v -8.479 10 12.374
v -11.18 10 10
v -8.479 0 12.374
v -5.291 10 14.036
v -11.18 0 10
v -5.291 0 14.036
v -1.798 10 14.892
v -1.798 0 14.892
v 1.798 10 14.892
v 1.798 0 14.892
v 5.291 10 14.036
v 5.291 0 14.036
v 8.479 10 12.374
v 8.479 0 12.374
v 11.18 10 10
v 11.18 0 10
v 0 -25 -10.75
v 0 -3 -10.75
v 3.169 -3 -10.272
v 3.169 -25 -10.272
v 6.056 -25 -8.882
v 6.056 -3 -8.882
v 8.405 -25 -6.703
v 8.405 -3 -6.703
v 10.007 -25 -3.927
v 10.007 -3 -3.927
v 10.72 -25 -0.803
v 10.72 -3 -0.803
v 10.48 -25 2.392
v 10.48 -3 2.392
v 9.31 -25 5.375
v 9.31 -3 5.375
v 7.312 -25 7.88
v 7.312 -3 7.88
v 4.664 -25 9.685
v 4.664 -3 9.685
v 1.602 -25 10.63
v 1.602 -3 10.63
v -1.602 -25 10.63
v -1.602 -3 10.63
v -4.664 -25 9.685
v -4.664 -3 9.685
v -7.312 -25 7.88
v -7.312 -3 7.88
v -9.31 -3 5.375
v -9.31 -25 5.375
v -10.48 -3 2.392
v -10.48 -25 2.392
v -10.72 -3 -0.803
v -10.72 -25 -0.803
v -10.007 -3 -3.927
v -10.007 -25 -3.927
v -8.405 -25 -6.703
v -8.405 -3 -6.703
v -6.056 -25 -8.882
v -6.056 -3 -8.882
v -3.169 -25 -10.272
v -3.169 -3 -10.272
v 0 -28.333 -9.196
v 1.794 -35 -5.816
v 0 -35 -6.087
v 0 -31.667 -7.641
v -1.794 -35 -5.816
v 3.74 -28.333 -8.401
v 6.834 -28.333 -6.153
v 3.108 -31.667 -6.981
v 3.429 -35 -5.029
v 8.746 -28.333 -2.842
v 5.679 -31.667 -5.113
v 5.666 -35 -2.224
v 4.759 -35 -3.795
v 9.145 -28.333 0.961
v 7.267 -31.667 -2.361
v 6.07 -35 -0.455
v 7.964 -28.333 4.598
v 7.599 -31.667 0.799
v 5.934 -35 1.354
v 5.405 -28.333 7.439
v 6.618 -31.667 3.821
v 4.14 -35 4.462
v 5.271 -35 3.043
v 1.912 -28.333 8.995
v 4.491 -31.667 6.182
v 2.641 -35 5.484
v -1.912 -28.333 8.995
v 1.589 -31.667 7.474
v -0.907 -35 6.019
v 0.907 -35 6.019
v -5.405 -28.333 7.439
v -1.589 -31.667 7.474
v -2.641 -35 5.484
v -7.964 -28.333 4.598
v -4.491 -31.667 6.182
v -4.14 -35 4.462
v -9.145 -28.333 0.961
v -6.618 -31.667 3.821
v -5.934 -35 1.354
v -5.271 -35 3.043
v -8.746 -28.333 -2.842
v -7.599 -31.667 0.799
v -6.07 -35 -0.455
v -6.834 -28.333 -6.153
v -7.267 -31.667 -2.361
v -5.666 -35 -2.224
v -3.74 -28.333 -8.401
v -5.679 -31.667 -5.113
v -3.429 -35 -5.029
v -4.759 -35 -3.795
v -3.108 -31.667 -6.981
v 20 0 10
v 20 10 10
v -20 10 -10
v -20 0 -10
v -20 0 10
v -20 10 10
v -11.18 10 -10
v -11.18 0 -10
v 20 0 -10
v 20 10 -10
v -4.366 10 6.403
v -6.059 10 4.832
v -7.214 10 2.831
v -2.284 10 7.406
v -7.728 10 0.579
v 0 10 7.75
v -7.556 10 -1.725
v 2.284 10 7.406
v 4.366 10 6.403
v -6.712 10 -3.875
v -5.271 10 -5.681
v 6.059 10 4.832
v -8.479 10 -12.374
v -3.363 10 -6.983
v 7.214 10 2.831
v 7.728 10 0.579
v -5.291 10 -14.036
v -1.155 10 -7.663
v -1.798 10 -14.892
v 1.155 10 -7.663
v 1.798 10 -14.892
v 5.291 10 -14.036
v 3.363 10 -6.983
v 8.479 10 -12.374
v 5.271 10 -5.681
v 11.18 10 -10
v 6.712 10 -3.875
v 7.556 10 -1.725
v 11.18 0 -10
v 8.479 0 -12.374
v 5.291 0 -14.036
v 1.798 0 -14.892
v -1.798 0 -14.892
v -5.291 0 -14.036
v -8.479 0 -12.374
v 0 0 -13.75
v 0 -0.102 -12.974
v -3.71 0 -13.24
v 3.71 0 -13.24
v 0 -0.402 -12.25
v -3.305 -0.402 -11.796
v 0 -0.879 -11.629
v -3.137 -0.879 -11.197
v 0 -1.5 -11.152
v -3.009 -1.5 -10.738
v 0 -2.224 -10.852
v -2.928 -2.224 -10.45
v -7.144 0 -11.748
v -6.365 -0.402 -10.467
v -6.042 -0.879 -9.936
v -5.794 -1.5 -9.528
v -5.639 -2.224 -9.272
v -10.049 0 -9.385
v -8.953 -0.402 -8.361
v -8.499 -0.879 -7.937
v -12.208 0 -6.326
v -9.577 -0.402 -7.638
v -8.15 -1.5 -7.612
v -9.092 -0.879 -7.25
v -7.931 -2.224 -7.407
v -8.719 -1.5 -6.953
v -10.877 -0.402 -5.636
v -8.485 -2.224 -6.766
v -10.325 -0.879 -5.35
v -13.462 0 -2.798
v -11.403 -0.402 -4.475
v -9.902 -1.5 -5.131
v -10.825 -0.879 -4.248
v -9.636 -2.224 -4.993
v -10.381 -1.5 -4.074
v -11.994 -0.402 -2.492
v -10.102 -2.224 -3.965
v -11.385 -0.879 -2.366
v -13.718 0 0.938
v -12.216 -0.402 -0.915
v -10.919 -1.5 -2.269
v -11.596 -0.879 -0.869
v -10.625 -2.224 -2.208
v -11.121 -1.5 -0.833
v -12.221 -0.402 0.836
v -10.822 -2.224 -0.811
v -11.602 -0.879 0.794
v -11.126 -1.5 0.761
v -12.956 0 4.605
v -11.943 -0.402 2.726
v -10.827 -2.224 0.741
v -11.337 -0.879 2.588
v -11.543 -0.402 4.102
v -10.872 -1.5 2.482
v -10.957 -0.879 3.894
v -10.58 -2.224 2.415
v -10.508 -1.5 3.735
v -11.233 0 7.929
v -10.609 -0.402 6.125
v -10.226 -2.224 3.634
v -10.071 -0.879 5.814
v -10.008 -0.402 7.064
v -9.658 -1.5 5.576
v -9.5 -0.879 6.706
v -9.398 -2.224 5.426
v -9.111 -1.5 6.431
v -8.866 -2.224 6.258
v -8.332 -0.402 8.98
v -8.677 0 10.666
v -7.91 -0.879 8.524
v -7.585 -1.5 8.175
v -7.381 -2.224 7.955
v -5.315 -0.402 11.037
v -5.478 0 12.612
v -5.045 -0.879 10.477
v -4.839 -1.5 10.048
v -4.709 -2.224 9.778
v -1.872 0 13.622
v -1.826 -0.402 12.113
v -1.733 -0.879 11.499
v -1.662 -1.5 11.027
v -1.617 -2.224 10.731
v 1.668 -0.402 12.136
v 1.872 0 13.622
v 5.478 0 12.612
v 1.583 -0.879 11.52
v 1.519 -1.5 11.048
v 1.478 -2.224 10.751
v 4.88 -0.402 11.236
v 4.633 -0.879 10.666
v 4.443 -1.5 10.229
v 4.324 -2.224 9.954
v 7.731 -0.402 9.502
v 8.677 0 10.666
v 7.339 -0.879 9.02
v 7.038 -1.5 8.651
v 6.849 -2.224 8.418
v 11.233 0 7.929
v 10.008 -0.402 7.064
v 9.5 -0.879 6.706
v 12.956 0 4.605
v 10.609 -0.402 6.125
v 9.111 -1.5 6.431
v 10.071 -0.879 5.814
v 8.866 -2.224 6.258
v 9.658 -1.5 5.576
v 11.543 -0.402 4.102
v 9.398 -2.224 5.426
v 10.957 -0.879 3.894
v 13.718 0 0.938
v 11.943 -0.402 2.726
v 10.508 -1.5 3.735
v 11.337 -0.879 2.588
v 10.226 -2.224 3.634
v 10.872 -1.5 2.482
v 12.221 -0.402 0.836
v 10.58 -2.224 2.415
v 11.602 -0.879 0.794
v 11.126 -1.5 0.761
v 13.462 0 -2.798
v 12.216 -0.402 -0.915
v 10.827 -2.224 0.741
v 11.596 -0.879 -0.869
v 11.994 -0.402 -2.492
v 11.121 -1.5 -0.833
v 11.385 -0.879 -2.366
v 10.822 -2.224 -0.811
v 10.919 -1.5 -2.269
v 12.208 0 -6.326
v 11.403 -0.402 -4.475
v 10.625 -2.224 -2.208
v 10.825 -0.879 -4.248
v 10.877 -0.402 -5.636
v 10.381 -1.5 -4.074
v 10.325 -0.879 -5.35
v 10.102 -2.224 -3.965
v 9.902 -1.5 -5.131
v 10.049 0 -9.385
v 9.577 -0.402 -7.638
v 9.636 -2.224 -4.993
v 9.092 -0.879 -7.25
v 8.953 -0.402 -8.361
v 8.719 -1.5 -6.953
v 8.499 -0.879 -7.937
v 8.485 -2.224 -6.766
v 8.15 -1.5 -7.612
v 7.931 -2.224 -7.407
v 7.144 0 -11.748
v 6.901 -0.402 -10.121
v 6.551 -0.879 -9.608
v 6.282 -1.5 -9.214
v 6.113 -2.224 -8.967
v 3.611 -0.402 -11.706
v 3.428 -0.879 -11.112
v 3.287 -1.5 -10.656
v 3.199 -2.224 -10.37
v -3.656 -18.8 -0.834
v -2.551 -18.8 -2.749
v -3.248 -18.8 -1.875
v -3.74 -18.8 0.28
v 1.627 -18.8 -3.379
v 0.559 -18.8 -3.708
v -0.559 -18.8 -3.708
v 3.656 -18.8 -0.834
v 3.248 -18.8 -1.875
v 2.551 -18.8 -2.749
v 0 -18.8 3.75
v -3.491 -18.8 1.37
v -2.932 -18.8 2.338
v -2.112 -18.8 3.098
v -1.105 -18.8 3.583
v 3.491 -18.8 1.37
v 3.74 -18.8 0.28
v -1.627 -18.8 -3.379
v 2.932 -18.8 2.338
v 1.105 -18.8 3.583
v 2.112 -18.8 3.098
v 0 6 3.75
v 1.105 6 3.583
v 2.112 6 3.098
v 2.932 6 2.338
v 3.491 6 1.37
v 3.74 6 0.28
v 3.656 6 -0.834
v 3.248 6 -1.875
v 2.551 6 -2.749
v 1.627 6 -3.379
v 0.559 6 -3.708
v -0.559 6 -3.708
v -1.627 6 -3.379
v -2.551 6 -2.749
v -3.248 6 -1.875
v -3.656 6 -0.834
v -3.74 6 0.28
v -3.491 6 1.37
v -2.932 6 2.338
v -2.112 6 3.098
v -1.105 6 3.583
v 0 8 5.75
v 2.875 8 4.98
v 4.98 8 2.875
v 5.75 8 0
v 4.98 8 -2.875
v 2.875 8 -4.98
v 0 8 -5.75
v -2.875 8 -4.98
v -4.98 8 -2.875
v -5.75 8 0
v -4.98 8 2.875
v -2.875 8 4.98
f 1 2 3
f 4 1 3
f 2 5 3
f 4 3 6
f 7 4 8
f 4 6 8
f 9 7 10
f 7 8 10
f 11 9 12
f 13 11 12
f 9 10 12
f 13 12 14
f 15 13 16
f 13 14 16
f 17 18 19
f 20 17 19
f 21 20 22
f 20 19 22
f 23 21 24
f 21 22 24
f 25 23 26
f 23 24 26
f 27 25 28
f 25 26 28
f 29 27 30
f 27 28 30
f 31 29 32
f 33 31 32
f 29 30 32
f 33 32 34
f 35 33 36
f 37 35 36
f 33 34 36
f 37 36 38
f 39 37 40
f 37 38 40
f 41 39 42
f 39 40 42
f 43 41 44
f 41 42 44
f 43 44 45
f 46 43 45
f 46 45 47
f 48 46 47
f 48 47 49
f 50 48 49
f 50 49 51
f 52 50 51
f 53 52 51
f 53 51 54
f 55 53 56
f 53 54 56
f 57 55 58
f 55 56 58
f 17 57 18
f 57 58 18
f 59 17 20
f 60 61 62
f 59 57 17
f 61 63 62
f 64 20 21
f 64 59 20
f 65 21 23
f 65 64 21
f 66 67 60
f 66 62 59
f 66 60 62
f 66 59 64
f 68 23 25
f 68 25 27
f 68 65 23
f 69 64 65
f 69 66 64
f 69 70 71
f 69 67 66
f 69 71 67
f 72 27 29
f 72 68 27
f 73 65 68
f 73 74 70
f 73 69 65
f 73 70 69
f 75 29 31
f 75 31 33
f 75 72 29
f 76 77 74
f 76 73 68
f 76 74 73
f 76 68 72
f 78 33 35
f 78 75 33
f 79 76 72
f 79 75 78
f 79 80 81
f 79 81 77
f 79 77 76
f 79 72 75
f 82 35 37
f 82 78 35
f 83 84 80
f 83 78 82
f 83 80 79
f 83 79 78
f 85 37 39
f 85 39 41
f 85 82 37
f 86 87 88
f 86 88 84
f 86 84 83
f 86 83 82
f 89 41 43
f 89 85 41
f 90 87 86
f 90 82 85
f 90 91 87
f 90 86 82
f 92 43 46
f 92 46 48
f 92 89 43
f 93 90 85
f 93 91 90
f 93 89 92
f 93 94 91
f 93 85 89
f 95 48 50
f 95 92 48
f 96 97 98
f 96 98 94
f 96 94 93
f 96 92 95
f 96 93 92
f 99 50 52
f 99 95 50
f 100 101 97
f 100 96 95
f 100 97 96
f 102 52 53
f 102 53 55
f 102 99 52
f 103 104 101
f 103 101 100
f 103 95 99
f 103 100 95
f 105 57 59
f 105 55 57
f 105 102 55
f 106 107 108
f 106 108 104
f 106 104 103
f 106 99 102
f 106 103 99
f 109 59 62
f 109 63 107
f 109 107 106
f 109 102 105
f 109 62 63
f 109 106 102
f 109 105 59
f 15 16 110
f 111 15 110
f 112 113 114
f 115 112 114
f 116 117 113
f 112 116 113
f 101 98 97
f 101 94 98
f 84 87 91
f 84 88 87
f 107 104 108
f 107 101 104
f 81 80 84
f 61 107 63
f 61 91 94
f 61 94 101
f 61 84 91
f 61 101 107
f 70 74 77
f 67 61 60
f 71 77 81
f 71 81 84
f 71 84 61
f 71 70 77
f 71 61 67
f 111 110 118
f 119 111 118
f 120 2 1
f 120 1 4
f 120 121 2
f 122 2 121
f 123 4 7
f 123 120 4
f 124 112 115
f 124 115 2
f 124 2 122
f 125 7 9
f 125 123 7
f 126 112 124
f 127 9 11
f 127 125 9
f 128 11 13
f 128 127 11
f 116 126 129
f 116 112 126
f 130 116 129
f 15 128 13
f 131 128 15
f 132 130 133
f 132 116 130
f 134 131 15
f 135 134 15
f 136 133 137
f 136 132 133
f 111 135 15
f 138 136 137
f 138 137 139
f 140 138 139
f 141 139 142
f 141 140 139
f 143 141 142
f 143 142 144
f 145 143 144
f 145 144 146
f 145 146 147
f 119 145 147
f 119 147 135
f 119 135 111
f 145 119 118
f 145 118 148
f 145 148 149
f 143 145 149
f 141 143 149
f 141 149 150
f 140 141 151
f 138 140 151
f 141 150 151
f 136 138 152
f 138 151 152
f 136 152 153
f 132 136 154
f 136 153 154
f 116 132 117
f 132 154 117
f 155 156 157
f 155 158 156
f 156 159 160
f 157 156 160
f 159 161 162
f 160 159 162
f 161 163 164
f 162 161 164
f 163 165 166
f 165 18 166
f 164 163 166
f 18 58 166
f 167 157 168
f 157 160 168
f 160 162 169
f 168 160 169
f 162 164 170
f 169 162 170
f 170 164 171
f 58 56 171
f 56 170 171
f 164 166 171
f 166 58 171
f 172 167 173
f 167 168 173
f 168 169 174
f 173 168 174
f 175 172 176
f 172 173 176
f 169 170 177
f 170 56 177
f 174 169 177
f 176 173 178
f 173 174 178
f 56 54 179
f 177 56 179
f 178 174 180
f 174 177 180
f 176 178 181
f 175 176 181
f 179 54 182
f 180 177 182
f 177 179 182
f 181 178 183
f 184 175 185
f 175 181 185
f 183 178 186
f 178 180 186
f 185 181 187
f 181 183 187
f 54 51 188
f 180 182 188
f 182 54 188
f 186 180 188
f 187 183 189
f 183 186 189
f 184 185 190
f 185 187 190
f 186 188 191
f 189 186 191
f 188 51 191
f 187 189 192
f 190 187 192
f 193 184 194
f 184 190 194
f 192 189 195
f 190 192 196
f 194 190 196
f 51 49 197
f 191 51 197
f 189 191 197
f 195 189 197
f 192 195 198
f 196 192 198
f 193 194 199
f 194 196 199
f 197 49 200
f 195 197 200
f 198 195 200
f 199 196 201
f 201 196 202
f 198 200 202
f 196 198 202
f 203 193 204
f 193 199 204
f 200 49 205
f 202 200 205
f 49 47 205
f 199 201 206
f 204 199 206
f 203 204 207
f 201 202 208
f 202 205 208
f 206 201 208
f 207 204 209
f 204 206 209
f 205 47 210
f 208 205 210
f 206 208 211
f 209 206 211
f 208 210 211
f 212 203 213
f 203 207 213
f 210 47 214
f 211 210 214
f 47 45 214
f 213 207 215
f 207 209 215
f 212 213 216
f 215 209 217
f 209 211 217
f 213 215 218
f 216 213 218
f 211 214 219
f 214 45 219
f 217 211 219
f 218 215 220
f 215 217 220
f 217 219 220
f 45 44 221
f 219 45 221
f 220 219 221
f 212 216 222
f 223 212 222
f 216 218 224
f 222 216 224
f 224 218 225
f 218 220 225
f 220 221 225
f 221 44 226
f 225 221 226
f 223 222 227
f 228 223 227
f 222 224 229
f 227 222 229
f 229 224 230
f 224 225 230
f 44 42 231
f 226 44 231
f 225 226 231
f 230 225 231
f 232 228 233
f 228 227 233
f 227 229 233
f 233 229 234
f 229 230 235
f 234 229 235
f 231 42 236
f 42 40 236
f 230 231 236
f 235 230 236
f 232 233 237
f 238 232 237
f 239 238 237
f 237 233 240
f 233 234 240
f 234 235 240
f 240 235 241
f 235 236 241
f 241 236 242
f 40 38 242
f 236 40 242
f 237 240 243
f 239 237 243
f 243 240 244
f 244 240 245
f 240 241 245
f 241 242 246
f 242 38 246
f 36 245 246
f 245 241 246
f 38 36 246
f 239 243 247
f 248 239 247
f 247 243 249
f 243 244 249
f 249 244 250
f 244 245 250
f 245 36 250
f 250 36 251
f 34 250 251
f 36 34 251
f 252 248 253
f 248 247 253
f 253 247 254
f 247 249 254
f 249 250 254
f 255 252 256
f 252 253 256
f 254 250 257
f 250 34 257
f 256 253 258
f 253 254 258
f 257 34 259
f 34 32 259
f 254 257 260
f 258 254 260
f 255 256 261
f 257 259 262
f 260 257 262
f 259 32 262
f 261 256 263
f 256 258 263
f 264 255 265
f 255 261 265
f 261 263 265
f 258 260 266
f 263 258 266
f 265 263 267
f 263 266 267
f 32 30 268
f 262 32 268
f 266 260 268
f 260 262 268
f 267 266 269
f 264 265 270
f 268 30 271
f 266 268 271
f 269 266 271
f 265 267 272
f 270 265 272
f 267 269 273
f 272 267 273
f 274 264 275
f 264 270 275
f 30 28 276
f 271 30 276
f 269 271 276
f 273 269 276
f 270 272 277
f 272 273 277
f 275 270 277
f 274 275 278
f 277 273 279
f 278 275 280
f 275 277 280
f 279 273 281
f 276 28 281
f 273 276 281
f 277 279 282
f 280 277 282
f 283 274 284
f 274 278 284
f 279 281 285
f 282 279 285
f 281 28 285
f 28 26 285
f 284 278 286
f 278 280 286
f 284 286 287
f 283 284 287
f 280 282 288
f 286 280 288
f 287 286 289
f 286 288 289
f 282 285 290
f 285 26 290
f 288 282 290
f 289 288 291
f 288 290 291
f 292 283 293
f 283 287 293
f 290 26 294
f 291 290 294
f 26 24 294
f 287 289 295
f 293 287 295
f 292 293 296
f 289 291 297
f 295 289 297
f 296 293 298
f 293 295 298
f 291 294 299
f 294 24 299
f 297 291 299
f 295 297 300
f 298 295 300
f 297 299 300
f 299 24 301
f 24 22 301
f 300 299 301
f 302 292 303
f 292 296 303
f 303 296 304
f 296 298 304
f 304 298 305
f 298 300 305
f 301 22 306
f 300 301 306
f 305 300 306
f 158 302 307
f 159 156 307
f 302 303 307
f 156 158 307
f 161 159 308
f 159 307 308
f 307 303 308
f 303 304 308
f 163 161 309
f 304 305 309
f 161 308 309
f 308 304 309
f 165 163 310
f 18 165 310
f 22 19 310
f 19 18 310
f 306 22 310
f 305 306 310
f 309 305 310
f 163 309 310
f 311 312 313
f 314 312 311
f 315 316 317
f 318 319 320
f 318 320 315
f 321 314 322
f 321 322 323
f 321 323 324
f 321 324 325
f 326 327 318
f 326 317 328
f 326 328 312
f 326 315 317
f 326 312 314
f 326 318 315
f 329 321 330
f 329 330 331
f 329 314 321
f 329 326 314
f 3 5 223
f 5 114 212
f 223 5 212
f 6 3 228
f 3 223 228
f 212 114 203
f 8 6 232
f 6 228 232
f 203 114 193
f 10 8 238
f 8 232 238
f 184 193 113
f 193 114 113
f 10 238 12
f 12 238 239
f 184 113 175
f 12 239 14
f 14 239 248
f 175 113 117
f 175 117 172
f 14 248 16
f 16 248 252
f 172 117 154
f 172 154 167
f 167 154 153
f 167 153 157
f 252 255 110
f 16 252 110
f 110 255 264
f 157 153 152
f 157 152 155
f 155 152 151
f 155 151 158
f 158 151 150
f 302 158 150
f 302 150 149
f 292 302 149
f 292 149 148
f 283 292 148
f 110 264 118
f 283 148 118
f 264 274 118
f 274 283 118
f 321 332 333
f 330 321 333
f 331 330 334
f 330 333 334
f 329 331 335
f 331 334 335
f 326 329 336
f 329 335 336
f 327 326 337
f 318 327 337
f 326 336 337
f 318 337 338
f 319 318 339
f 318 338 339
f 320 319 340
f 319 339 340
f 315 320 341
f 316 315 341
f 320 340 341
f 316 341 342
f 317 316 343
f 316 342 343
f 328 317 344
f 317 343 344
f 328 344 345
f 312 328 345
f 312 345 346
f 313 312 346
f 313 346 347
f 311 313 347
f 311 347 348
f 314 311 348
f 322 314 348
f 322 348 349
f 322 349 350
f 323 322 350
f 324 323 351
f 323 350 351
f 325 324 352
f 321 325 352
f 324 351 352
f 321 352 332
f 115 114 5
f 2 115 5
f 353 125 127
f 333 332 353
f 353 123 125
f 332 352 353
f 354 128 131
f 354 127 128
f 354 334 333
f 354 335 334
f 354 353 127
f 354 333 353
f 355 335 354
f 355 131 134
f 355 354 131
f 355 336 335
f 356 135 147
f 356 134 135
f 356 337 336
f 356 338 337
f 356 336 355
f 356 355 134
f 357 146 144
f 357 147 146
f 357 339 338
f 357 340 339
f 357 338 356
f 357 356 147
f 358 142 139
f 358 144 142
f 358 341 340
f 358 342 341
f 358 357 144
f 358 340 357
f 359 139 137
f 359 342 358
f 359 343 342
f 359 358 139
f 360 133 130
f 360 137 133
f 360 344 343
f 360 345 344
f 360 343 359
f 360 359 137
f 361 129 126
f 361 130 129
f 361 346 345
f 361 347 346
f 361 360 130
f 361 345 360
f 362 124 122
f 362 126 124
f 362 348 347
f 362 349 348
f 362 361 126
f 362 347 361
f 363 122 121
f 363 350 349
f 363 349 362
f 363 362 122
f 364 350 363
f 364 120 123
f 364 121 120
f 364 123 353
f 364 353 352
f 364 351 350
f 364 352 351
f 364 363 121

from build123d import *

# Parameters (mm, degrees)
SKETCH1_R           = 15
BOSS_EXTRUDE1_DEPTH = 10
SKETCH2_R           = 10.75
BOSS_EXTRUDE2_DEPTH = 25
SKETCH3_R           = 3.75
CUT_EXTRUDE1_DEPTH  = 28.8
SKETCH5_R           = 10.75
BOSS_EXTRUDE4_DEPTH = 10
BOSS_EXTRUDE4_TAPER = 25
CHAMFER1_SIZE       = 4
BOSS_EXTRUDE3_START = -10
SKETCH4_R           = 7.75
BOSS_EXTRUDE3_DEPTH = 10
FILLET1_R           = 3


with BuildPart() as part:
    # Sketch1 → Boss-Extrude1 (new body)
    with BuildSketch(Plane(origin=(0, 0, 0), x_dir=(1, 0, 0), z_dir=(0, 1, 0))):
        with Locations(Location((0, 0, 0), (0, 0, 270))):
            Circle(SKETCH1_R)
    extrude(amount=BOSS_EXTRUDE1_DEPTH)

    # Sketch2 → Boss-Extrude2 (add)
    with BuildSketch(Plane.XZ):
        with Locations(Location((0, 0, 0), (0, 0, 270))):
            Circle(SKETCH2_R)
    extrude(amount=BOSS_EXTRUDE2_DEPTH)

    # Sketch3 → Cut-Extrude1 (cut)
    with BuildSketch(Plane(origin=(0, 10, 0), x_dir=(1, 0, 0), z_dir=(0, 1, 0))):
        with Locations(Location((0, 0, 0), (0, 0, 270))):
            Circle(SKETCH3_R)
    extrude(amount=-CUT_EXTRUDE1_DEPTH, mode=Mode.SUBTRACT)

    # Sketch5 → Boss-Extrude4 (add)
    with BuildSketch(Plane.XZ.offset(25)):
        with Locations(Location((0, 0, 0), (0, 0, 270))):
            Circle(SKETCH5_R)
    extrude(amount=BOSS_EXTRUDE4_DEPTH, taper=BOSS_EXTRUDE4_TAPER)

    # Chamfer1
    chamfer1_edges = [part.edges().sort_by_distance(p)[0] for p in [
        (0, 10, -3.75),
    ]]
    chamfer(chamfer1_edges, length=CHAMFER1_SIZE)

    # Sketch4 → Boss-Extrude3 (add)
    # profile 1 of 3: a face of its own
    with BuildSketch(Plane(origin=(0, 10, 0), x_dir=(1, 0, 0), z_dir=(0, 1, 0)).offset(BOSS_EXTRUDE3_START)):
        with BuildLine():
            Line((-11.180339887, 10), (-20, 10))
            Line((-20, 10), (-20, -10))
            Line((-20, -10), (-11.180339887, -10))
            ThreePointArc((-11.180339887, -10), (-15, 0), (-11.180339887, 10))
        make_face()
    # profile 2 of 3: a face of its own
    with BuildSketch(Plane(origin=(0, 10, 0), x_dir=(1, 0, 0), z_dir=(0, 1, 0)).offset(BOSS_EXTRUDE3_START)):
        with BuildLine():
            Line((11.180339887, 10), (-11.180339887, 10))
            ThreePointArc((-11.180339887, 10), (-15, 0), (-11.180339887, -10))
            Line((-11.180339887, -10), (11.180339887, -10))
            ThreePointArc((11.180339887, -10), (14.012585384, -5.352331347), (15, 0))
            ThreePointArc((15, 0), (14.012585384, 5.352331347), (11.180339887, 10))
        make_face()
        Circle(SKETCH4_R, mode=Mode.SUBTRACT)
    # profile 3 of 3: a face of its own
    with BuildSketch(Plane(origin=(0, 10, 0), x_dir=(1, 0, 0), z_dir=(0, 1, 0)).offset(BOSS_EXTRUDE3_START)):
        with BuildLine():
            Line((20, 10), (11.180339887, 10))
            ThreePointArc((11.180339887, 10), (14.012585384, 5.352331347), (15, 0))
            ThreePointArc((15, 0), (14.012585384, -5.352331347), (11.180339887, -10))
            Line((11.180339887, -10), (20, -10))
            Line((20, -10), (20, 10))
        make_face()
    extrude(amount=BOSS_EXTRUDE3_DEPTH)

    # Fillet1
    fillet1_edges = [part.edges().sort_by_distance(p)[0] for p in [
        (0, 0, 10.75),
    ]]
    fillet(fillet1_edges, radius=FILLET1_R)


solid = part.part
